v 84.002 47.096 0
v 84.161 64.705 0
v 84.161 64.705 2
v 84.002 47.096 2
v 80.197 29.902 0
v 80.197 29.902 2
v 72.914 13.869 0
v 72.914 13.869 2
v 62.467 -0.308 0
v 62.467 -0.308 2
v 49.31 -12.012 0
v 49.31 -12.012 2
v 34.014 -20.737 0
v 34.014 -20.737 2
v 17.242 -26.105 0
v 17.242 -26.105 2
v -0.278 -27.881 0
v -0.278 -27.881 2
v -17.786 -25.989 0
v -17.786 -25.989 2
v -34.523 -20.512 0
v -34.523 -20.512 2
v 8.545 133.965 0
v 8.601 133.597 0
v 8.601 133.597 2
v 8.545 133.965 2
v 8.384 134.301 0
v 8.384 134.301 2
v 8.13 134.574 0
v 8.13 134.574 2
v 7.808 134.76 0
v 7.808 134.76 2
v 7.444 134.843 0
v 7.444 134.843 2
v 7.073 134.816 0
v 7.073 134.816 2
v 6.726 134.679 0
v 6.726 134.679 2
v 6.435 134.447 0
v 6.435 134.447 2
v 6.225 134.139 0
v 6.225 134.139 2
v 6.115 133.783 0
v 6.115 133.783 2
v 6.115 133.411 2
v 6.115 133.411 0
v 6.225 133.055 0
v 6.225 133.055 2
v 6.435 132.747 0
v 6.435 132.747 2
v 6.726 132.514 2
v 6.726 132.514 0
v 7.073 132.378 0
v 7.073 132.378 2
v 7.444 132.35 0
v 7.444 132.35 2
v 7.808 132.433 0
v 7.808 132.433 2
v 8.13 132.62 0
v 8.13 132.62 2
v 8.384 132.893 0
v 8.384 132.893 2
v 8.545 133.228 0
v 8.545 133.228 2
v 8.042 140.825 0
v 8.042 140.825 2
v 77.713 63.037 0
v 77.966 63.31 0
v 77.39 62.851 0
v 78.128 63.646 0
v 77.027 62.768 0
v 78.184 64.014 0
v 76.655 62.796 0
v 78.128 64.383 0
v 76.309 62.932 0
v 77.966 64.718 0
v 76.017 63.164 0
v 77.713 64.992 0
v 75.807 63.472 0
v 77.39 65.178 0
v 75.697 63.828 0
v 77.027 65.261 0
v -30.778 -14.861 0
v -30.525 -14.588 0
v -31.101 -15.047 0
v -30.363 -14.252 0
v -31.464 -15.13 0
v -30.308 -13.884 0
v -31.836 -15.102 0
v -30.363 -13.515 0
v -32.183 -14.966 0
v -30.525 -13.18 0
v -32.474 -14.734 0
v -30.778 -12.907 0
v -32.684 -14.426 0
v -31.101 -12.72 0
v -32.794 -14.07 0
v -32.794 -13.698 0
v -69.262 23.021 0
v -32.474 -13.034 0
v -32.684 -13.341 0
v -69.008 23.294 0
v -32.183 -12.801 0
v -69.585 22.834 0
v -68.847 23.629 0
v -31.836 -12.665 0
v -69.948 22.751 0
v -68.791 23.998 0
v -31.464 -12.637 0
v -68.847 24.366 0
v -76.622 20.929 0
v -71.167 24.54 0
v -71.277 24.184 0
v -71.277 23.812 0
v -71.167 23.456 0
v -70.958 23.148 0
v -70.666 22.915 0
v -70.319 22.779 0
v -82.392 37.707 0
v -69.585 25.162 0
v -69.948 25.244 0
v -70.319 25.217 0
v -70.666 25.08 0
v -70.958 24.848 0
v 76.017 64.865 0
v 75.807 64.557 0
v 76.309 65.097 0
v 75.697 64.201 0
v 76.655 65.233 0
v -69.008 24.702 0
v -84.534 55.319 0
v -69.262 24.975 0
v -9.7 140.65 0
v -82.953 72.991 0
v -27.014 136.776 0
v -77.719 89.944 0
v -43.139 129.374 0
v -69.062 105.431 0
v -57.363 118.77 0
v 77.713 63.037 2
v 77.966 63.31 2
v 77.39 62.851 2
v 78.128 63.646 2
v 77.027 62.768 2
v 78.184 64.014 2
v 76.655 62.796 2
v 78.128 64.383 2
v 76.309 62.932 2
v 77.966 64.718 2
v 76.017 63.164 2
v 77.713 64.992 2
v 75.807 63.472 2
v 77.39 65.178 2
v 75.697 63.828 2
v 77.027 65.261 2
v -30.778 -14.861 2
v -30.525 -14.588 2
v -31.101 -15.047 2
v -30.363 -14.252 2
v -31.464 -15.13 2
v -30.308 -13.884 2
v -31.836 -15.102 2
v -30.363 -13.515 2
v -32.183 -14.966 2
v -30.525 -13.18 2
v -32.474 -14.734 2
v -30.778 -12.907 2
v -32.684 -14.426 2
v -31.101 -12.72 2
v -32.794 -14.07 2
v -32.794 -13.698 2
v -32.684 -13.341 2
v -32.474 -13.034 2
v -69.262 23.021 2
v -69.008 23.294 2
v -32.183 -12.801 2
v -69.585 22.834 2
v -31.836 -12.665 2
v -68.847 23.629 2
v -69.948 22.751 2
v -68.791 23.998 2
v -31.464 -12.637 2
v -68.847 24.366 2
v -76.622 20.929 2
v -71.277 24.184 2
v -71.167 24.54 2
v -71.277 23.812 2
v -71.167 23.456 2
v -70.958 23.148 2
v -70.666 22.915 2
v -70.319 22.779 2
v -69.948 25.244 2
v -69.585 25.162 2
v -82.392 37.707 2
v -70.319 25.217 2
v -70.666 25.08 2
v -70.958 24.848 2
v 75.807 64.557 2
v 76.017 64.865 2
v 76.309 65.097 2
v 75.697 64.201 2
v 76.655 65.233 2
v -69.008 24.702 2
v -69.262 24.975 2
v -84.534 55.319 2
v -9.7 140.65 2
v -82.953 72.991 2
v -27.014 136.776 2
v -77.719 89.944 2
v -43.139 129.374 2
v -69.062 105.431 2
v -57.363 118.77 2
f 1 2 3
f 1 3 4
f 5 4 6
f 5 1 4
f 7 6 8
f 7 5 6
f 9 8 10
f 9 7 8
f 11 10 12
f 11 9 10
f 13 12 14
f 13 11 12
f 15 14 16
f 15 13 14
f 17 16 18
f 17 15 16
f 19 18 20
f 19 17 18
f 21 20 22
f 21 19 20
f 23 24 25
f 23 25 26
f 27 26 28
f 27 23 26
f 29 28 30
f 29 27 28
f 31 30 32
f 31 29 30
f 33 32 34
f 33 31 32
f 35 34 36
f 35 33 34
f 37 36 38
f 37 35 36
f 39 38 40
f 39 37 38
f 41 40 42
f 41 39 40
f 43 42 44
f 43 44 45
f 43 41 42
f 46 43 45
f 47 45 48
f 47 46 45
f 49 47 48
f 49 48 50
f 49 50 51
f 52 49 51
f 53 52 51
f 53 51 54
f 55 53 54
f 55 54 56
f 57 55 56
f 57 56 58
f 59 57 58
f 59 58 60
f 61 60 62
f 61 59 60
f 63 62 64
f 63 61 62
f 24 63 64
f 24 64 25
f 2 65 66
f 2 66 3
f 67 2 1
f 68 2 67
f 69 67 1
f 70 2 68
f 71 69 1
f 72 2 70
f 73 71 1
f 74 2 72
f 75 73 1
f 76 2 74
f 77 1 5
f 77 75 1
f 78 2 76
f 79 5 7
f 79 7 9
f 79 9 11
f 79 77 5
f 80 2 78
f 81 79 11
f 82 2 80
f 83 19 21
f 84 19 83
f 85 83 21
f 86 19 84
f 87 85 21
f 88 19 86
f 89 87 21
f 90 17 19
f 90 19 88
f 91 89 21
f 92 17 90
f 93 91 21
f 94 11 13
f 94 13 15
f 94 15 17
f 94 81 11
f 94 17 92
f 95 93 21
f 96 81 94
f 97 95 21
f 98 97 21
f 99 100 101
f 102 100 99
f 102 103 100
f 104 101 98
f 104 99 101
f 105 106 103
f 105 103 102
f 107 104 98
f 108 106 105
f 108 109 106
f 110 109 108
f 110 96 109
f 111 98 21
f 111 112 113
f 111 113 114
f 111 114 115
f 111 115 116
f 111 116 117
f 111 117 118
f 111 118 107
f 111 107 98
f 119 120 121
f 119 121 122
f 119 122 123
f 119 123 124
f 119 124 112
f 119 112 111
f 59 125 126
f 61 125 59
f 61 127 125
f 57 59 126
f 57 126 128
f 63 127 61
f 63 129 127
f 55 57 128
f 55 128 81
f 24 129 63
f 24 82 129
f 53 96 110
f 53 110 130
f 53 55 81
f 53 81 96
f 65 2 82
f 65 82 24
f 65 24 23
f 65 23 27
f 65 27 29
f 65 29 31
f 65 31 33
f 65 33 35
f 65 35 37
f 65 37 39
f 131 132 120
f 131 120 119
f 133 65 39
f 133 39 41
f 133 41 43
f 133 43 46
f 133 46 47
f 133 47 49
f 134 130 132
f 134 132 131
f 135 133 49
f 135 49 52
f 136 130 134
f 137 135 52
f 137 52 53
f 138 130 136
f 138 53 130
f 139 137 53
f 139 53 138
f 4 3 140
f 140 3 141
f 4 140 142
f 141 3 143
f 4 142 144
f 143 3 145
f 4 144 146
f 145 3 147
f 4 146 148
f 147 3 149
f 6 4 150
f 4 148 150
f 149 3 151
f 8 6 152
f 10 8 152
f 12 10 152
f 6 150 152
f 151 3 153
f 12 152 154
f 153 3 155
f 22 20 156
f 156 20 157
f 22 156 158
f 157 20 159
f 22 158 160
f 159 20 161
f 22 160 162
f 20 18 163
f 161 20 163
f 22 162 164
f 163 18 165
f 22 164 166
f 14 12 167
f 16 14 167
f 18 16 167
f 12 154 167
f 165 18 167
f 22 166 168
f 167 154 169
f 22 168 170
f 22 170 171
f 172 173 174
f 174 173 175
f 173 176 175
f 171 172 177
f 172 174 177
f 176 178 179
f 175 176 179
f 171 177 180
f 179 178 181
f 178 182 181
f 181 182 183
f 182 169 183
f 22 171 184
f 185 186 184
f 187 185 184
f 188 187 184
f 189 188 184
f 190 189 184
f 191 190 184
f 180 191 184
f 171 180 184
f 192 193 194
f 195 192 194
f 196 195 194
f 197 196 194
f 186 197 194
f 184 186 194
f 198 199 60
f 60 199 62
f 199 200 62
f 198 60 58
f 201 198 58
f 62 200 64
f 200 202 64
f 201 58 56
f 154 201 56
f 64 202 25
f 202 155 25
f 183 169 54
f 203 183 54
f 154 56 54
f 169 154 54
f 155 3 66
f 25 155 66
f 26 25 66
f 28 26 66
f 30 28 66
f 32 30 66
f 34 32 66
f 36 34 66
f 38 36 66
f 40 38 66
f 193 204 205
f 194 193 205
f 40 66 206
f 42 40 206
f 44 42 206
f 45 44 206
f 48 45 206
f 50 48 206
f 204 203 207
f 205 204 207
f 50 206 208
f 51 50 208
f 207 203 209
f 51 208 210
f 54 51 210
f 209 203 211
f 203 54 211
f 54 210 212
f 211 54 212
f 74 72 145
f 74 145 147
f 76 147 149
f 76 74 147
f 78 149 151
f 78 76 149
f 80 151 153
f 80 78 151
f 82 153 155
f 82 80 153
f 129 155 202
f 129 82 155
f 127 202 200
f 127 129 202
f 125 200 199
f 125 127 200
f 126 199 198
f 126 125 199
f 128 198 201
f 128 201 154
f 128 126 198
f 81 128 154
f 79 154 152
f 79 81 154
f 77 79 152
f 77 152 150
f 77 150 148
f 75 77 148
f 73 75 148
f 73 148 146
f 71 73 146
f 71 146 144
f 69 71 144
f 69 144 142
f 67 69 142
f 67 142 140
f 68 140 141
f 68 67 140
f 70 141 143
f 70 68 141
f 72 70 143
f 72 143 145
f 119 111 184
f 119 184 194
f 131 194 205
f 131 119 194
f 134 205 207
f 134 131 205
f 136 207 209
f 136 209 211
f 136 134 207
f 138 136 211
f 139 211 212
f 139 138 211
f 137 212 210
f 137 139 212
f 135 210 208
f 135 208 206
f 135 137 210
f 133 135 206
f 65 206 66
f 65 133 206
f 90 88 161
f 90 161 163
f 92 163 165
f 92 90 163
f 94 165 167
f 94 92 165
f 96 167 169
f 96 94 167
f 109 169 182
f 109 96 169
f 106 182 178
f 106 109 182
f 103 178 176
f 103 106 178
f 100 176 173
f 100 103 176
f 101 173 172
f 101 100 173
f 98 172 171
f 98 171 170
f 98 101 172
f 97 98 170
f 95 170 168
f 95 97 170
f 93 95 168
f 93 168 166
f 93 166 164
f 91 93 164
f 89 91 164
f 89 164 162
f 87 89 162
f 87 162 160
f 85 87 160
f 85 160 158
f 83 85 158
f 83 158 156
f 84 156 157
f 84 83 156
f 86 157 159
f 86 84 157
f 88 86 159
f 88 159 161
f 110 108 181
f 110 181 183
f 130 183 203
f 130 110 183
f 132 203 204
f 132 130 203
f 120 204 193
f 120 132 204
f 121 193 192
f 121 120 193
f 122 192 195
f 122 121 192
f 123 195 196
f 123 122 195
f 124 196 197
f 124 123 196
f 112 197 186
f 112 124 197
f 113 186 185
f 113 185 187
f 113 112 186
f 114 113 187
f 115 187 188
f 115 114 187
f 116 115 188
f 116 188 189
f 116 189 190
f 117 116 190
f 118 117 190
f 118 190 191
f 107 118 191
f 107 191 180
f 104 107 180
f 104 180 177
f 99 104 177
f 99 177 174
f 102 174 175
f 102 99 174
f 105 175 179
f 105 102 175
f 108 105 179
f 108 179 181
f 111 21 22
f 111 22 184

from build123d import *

# Parameters (mm, degrees)
ESBO_O1_R                = 1.25
RESSALTO_EXTRUS_O1_DEPTH = 2


with BuildPart() as part:
    # Esboço1 → Ressalto-extrusão1 (new body)
    with BuildSketch(Plane.XY):
        with BuildLine():
            Line((64.019528598, 84.846815111), (84.16137873, 64.704964979))
            ThreePointArc((84.16137873, 64.704964979), (49.309954929, -12.012204688), (-34.522641382, -20.511713992))
            Line((-34.522641382, -20.511713992), (-76.621548101, 20.929016434))
            ThreePointArc((-76.621548101, 20.929016434), (-69.061916809, 105.430734899), (8.041603414, 140.824740295))
            Line((8.041603414, 140.824740295), (28.423773233, 120.442570476))
            Line((28.423773233, 120.442570476), (64.019528598, 84.846815111))
        make_face()
        with Locations((-31.557799421, -13.88383463)):
            Circle(ESBO_O1_R, mode=Mode.SUBTRACT)
        with Locations((7.350981773, 133.596869623)):
            Circle(ESBO_O1_R, mode=Mode.SUBTRACT)
        with Locations((76.933508058, 64.014343338)):
            Circle(ESBO_O1_R, mode=Mode.SUBTRACT)
        with Locations((-70.041206278, 23.99792083)):
            Circle(ESBO_O1_R, mode=Mode.SUBTRACT)
    extrude(amount=RESSALTO_EXTRUS_O1_DEPTH)


solid = part.part
